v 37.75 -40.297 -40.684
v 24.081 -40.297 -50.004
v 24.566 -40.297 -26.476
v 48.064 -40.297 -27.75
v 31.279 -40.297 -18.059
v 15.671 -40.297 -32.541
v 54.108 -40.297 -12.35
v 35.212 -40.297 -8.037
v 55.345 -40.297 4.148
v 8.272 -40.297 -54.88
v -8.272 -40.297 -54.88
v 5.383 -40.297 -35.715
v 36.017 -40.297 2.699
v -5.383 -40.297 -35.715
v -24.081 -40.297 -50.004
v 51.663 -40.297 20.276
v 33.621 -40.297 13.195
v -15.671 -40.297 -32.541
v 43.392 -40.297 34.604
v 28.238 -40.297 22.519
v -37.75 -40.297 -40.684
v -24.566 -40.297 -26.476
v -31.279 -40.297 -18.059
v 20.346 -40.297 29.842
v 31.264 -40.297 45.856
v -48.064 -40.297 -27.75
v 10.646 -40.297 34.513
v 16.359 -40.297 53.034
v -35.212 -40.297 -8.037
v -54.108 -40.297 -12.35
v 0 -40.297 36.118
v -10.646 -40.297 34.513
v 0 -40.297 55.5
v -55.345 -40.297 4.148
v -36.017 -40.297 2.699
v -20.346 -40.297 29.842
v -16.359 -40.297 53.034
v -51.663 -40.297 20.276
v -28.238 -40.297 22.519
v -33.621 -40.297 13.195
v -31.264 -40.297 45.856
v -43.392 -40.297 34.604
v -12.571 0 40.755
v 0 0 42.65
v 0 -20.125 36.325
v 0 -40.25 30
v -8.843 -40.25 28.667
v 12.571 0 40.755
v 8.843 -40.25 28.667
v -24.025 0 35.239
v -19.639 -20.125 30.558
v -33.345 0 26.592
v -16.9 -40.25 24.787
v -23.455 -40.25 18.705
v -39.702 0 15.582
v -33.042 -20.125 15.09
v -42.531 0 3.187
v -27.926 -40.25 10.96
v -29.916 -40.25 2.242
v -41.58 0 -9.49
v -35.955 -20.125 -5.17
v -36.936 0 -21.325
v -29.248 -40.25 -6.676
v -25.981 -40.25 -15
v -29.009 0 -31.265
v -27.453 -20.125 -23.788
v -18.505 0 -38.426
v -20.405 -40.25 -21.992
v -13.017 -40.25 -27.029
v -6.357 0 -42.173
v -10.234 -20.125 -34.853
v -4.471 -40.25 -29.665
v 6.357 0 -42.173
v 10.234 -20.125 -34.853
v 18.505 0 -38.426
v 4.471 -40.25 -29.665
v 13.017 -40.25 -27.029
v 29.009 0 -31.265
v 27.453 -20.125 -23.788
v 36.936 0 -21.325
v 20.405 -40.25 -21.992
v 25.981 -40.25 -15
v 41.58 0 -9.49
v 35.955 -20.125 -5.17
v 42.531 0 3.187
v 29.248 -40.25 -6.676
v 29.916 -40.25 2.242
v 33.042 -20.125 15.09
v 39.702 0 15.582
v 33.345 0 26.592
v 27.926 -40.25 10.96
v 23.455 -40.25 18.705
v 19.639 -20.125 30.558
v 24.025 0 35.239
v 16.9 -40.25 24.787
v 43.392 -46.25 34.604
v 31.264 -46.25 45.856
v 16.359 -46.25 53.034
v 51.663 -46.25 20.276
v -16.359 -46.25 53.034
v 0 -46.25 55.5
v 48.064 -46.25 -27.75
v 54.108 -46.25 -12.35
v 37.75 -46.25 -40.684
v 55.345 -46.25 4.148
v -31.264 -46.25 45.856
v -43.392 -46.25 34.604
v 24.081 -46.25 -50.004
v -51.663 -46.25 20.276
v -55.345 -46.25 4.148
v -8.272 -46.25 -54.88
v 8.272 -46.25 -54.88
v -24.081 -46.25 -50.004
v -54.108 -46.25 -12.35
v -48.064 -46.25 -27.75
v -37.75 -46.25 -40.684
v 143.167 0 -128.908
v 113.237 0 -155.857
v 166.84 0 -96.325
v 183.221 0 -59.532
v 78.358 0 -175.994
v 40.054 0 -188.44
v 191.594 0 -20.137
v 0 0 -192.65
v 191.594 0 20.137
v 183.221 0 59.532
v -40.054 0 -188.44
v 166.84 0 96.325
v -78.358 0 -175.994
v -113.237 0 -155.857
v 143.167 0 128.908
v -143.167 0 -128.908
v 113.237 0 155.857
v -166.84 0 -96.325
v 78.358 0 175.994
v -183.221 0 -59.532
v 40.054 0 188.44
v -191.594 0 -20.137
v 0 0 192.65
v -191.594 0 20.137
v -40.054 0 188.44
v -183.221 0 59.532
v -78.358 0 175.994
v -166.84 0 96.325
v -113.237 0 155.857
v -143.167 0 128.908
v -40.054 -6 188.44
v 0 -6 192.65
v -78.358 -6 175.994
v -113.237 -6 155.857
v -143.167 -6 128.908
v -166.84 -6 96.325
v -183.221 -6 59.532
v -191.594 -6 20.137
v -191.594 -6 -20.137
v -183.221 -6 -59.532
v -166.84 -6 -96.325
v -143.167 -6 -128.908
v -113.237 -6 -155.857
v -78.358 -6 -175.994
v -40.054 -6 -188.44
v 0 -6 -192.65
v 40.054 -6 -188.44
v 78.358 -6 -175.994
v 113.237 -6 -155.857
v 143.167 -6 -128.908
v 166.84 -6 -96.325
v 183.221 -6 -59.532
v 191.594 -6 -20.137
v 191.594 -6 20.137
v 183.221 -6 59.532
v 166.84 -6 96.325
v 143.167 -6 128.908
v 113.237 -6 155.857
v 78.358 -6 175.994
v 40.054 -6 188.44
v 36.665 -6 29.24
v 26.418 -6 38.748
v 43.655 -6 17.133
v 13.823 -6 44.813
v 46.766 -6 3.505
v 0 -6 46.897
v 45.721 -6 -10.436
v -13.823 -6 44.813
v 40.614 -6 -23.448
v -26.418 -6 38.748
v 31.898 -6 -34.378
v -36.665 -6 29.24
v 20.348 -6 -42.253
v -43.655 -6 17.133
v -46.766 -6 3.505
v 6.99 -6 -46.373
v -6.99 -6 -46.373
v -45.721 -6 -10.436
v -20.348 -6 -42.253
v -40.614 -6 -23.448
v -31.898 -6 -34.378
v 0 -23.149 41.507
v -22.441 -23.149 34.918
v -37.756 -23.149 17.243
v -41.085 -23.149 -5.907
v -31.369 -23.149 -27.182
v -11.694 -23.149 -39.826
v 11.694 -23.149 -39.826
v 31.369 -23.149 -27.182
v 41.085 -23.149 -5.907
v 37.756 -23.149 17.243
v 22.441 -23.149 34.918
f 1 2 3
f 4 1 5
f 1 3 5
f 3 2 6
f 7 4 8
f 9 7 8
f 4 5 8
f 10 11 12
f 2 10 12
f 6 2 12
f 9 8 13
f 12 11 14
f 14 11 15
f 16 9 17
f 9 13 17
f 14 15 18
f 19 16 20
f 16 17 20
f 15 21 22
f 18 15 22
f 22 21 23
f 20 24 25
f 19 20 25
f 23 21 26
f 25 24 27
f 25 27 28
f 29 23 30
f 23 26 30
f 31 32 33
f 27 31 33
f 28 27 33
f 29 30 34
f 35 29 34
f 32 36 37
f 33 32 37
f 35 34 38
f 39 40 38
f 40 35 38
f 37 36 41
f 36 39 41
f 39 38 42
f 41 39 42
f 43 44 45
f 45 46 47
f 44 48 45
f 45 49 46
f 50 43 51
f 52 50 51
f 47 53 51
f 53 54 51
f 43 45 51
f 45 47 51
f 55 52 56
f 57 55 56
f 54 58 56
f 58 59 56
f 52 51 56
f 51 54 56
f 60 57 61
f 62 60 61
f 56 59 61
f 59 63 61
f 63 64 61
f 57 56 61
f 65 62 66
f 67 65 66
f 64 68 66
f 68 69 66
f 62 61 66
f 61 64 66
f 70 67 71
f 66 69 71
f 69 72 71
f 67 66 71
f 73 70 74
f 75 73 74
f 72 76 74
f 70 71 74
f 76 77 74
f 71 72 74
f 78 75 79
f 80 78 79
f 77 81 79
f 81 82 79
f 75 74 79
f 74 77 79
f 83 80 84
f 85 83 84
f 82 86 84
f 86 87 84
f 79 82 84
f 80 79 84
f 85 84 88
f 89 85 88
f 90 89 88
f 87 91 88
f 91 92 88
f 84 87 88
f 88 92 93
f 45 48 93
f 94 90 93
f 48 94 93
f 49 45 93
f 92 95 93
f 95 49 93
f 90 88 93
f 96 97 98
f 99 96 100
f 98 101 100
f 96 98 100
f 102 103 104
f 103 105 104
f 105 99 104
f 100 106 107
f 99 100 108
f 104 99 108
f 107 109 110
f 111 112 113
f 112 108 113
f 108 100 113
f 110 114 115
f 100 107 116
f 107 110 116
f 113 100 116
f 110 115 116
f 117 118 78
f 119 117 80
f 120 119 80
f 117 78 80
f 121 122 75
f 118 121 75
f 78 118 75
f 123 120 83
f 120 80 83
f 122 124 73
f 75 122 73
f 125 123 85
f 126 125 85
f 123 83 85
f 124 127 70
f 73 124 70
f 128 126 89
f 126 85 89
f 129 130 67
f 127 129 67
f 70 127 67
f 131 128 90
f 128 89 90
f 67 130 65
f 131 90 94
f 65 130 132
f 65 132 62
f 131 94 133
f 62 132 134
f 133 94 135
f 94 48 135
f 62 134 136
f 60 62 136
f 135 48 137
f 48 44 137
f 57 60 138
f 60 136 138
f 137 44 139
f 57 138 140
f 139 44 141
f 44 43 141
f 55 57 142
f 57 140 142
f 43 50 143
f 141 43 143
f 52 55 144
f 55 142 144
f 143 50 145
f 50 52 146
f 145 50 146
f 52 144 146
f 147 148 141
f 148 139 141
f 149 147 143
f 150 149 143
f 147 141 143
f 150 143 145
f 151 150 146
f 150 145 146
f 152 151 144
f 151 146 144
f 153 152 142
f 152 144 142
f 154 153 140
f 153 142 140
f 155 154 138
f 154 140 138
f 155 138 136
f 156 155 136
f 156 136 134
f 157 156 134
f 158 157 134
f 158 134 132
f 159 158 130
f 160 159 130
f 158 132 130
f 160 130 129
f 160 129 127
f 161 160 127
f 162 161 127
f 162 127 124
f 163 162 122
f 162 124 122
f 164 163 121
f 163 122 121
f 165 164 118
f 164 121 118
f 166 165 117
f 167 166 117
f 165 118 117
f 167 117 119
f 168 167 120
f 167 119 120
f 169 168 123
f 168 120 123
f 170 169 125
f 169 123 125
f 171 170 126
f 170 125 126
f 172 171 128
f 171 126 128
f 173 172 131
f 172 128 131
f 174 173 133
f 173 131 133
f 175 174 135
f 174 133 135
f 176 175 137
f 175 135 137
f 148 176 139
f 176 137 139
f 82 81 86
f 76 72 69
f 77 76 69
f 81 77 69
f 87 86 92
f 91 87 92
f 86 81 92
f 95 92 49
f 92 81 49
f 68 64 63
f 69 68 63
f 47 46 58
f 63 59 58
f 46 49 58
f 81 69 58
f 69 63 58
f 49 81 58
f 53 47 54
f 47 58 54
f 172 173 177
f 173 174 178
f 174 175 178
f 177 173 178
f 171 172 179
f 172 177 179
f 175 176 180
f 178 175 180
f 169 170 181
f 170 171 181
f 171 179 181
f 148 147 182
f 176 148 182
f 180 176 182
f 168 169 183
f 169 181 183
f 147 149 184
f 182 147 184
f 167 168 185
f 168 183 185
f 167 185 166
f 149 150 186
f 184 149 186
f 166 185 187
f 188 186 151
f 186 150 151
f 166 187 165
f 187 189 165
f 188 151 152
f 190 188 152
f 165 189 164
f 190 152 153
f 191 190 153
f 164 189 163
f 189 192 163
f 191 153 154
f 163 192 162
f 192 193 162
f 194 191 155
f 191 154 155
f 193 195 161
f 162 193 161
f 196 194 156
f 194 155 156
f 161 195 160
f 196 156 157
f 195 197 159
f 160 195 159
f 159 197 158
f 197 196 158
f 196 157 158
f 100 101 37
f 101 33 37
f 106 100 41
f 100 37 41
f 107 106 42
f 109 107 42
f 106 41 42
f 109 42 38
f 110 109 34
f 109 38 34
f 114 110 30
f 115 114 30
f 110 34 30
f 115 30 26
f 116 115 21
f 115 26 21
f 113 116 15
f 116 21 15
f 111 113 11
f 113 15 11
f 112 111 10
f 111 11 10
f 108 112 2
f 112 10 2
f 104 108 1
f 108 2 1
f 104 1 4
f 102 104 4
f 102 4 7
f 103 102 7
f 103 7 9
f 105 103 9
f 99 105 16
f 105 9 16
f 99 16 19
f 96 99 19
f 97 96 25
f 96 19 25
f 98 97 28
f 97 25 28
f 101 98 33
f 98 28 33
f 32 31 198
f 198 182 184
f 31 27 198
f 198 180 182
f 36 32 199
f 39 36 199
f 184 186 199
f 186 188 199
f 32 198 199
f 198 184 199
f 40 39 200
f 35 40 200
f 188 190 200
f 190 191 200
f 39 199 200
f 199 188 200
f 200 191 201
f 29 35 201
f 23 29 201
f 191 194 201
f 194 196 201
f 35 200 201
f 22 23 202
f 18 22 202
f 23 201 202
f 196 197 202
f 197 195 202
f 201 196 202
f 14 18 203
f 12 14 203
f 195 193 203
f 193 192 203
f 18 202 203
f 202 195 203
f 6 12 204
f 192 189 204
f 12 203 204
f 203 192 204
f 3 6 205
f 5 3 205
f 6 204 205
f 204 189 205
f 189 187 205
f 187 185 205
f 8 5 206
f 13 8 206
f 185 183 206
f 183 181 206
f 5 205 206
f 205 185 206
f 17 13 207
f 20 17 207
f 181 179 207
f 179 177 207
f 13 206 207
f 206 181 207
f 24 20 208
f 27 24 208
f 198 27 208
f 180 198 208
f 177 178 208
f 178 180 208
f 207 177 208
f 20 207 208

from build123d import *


with BuildPart() as part:
    # Sketch1 → Revolve2 (revolve)
    with BuildSketch(Plane.XY, mode=Mode.PRIVATE) as revolve2_sk:
        Polygon((0, -40.25), (0, -46.25), (55.5, -46.25), (55.5, -40.29713119), (36.117911549, -40.29713119), (46.896841146, -6), (192.649801929, -6), (192.649801929, 0), (42.649801929, 0), (30, -40.25), align=None)
    revolve(revolve2_sk.sketch.rotate(Axis((0, -40.25, 0), (0, -1, 0)), 90), axis=Axis((0, -40.25, 0), (0, -1, 0)))


solid = part.part
